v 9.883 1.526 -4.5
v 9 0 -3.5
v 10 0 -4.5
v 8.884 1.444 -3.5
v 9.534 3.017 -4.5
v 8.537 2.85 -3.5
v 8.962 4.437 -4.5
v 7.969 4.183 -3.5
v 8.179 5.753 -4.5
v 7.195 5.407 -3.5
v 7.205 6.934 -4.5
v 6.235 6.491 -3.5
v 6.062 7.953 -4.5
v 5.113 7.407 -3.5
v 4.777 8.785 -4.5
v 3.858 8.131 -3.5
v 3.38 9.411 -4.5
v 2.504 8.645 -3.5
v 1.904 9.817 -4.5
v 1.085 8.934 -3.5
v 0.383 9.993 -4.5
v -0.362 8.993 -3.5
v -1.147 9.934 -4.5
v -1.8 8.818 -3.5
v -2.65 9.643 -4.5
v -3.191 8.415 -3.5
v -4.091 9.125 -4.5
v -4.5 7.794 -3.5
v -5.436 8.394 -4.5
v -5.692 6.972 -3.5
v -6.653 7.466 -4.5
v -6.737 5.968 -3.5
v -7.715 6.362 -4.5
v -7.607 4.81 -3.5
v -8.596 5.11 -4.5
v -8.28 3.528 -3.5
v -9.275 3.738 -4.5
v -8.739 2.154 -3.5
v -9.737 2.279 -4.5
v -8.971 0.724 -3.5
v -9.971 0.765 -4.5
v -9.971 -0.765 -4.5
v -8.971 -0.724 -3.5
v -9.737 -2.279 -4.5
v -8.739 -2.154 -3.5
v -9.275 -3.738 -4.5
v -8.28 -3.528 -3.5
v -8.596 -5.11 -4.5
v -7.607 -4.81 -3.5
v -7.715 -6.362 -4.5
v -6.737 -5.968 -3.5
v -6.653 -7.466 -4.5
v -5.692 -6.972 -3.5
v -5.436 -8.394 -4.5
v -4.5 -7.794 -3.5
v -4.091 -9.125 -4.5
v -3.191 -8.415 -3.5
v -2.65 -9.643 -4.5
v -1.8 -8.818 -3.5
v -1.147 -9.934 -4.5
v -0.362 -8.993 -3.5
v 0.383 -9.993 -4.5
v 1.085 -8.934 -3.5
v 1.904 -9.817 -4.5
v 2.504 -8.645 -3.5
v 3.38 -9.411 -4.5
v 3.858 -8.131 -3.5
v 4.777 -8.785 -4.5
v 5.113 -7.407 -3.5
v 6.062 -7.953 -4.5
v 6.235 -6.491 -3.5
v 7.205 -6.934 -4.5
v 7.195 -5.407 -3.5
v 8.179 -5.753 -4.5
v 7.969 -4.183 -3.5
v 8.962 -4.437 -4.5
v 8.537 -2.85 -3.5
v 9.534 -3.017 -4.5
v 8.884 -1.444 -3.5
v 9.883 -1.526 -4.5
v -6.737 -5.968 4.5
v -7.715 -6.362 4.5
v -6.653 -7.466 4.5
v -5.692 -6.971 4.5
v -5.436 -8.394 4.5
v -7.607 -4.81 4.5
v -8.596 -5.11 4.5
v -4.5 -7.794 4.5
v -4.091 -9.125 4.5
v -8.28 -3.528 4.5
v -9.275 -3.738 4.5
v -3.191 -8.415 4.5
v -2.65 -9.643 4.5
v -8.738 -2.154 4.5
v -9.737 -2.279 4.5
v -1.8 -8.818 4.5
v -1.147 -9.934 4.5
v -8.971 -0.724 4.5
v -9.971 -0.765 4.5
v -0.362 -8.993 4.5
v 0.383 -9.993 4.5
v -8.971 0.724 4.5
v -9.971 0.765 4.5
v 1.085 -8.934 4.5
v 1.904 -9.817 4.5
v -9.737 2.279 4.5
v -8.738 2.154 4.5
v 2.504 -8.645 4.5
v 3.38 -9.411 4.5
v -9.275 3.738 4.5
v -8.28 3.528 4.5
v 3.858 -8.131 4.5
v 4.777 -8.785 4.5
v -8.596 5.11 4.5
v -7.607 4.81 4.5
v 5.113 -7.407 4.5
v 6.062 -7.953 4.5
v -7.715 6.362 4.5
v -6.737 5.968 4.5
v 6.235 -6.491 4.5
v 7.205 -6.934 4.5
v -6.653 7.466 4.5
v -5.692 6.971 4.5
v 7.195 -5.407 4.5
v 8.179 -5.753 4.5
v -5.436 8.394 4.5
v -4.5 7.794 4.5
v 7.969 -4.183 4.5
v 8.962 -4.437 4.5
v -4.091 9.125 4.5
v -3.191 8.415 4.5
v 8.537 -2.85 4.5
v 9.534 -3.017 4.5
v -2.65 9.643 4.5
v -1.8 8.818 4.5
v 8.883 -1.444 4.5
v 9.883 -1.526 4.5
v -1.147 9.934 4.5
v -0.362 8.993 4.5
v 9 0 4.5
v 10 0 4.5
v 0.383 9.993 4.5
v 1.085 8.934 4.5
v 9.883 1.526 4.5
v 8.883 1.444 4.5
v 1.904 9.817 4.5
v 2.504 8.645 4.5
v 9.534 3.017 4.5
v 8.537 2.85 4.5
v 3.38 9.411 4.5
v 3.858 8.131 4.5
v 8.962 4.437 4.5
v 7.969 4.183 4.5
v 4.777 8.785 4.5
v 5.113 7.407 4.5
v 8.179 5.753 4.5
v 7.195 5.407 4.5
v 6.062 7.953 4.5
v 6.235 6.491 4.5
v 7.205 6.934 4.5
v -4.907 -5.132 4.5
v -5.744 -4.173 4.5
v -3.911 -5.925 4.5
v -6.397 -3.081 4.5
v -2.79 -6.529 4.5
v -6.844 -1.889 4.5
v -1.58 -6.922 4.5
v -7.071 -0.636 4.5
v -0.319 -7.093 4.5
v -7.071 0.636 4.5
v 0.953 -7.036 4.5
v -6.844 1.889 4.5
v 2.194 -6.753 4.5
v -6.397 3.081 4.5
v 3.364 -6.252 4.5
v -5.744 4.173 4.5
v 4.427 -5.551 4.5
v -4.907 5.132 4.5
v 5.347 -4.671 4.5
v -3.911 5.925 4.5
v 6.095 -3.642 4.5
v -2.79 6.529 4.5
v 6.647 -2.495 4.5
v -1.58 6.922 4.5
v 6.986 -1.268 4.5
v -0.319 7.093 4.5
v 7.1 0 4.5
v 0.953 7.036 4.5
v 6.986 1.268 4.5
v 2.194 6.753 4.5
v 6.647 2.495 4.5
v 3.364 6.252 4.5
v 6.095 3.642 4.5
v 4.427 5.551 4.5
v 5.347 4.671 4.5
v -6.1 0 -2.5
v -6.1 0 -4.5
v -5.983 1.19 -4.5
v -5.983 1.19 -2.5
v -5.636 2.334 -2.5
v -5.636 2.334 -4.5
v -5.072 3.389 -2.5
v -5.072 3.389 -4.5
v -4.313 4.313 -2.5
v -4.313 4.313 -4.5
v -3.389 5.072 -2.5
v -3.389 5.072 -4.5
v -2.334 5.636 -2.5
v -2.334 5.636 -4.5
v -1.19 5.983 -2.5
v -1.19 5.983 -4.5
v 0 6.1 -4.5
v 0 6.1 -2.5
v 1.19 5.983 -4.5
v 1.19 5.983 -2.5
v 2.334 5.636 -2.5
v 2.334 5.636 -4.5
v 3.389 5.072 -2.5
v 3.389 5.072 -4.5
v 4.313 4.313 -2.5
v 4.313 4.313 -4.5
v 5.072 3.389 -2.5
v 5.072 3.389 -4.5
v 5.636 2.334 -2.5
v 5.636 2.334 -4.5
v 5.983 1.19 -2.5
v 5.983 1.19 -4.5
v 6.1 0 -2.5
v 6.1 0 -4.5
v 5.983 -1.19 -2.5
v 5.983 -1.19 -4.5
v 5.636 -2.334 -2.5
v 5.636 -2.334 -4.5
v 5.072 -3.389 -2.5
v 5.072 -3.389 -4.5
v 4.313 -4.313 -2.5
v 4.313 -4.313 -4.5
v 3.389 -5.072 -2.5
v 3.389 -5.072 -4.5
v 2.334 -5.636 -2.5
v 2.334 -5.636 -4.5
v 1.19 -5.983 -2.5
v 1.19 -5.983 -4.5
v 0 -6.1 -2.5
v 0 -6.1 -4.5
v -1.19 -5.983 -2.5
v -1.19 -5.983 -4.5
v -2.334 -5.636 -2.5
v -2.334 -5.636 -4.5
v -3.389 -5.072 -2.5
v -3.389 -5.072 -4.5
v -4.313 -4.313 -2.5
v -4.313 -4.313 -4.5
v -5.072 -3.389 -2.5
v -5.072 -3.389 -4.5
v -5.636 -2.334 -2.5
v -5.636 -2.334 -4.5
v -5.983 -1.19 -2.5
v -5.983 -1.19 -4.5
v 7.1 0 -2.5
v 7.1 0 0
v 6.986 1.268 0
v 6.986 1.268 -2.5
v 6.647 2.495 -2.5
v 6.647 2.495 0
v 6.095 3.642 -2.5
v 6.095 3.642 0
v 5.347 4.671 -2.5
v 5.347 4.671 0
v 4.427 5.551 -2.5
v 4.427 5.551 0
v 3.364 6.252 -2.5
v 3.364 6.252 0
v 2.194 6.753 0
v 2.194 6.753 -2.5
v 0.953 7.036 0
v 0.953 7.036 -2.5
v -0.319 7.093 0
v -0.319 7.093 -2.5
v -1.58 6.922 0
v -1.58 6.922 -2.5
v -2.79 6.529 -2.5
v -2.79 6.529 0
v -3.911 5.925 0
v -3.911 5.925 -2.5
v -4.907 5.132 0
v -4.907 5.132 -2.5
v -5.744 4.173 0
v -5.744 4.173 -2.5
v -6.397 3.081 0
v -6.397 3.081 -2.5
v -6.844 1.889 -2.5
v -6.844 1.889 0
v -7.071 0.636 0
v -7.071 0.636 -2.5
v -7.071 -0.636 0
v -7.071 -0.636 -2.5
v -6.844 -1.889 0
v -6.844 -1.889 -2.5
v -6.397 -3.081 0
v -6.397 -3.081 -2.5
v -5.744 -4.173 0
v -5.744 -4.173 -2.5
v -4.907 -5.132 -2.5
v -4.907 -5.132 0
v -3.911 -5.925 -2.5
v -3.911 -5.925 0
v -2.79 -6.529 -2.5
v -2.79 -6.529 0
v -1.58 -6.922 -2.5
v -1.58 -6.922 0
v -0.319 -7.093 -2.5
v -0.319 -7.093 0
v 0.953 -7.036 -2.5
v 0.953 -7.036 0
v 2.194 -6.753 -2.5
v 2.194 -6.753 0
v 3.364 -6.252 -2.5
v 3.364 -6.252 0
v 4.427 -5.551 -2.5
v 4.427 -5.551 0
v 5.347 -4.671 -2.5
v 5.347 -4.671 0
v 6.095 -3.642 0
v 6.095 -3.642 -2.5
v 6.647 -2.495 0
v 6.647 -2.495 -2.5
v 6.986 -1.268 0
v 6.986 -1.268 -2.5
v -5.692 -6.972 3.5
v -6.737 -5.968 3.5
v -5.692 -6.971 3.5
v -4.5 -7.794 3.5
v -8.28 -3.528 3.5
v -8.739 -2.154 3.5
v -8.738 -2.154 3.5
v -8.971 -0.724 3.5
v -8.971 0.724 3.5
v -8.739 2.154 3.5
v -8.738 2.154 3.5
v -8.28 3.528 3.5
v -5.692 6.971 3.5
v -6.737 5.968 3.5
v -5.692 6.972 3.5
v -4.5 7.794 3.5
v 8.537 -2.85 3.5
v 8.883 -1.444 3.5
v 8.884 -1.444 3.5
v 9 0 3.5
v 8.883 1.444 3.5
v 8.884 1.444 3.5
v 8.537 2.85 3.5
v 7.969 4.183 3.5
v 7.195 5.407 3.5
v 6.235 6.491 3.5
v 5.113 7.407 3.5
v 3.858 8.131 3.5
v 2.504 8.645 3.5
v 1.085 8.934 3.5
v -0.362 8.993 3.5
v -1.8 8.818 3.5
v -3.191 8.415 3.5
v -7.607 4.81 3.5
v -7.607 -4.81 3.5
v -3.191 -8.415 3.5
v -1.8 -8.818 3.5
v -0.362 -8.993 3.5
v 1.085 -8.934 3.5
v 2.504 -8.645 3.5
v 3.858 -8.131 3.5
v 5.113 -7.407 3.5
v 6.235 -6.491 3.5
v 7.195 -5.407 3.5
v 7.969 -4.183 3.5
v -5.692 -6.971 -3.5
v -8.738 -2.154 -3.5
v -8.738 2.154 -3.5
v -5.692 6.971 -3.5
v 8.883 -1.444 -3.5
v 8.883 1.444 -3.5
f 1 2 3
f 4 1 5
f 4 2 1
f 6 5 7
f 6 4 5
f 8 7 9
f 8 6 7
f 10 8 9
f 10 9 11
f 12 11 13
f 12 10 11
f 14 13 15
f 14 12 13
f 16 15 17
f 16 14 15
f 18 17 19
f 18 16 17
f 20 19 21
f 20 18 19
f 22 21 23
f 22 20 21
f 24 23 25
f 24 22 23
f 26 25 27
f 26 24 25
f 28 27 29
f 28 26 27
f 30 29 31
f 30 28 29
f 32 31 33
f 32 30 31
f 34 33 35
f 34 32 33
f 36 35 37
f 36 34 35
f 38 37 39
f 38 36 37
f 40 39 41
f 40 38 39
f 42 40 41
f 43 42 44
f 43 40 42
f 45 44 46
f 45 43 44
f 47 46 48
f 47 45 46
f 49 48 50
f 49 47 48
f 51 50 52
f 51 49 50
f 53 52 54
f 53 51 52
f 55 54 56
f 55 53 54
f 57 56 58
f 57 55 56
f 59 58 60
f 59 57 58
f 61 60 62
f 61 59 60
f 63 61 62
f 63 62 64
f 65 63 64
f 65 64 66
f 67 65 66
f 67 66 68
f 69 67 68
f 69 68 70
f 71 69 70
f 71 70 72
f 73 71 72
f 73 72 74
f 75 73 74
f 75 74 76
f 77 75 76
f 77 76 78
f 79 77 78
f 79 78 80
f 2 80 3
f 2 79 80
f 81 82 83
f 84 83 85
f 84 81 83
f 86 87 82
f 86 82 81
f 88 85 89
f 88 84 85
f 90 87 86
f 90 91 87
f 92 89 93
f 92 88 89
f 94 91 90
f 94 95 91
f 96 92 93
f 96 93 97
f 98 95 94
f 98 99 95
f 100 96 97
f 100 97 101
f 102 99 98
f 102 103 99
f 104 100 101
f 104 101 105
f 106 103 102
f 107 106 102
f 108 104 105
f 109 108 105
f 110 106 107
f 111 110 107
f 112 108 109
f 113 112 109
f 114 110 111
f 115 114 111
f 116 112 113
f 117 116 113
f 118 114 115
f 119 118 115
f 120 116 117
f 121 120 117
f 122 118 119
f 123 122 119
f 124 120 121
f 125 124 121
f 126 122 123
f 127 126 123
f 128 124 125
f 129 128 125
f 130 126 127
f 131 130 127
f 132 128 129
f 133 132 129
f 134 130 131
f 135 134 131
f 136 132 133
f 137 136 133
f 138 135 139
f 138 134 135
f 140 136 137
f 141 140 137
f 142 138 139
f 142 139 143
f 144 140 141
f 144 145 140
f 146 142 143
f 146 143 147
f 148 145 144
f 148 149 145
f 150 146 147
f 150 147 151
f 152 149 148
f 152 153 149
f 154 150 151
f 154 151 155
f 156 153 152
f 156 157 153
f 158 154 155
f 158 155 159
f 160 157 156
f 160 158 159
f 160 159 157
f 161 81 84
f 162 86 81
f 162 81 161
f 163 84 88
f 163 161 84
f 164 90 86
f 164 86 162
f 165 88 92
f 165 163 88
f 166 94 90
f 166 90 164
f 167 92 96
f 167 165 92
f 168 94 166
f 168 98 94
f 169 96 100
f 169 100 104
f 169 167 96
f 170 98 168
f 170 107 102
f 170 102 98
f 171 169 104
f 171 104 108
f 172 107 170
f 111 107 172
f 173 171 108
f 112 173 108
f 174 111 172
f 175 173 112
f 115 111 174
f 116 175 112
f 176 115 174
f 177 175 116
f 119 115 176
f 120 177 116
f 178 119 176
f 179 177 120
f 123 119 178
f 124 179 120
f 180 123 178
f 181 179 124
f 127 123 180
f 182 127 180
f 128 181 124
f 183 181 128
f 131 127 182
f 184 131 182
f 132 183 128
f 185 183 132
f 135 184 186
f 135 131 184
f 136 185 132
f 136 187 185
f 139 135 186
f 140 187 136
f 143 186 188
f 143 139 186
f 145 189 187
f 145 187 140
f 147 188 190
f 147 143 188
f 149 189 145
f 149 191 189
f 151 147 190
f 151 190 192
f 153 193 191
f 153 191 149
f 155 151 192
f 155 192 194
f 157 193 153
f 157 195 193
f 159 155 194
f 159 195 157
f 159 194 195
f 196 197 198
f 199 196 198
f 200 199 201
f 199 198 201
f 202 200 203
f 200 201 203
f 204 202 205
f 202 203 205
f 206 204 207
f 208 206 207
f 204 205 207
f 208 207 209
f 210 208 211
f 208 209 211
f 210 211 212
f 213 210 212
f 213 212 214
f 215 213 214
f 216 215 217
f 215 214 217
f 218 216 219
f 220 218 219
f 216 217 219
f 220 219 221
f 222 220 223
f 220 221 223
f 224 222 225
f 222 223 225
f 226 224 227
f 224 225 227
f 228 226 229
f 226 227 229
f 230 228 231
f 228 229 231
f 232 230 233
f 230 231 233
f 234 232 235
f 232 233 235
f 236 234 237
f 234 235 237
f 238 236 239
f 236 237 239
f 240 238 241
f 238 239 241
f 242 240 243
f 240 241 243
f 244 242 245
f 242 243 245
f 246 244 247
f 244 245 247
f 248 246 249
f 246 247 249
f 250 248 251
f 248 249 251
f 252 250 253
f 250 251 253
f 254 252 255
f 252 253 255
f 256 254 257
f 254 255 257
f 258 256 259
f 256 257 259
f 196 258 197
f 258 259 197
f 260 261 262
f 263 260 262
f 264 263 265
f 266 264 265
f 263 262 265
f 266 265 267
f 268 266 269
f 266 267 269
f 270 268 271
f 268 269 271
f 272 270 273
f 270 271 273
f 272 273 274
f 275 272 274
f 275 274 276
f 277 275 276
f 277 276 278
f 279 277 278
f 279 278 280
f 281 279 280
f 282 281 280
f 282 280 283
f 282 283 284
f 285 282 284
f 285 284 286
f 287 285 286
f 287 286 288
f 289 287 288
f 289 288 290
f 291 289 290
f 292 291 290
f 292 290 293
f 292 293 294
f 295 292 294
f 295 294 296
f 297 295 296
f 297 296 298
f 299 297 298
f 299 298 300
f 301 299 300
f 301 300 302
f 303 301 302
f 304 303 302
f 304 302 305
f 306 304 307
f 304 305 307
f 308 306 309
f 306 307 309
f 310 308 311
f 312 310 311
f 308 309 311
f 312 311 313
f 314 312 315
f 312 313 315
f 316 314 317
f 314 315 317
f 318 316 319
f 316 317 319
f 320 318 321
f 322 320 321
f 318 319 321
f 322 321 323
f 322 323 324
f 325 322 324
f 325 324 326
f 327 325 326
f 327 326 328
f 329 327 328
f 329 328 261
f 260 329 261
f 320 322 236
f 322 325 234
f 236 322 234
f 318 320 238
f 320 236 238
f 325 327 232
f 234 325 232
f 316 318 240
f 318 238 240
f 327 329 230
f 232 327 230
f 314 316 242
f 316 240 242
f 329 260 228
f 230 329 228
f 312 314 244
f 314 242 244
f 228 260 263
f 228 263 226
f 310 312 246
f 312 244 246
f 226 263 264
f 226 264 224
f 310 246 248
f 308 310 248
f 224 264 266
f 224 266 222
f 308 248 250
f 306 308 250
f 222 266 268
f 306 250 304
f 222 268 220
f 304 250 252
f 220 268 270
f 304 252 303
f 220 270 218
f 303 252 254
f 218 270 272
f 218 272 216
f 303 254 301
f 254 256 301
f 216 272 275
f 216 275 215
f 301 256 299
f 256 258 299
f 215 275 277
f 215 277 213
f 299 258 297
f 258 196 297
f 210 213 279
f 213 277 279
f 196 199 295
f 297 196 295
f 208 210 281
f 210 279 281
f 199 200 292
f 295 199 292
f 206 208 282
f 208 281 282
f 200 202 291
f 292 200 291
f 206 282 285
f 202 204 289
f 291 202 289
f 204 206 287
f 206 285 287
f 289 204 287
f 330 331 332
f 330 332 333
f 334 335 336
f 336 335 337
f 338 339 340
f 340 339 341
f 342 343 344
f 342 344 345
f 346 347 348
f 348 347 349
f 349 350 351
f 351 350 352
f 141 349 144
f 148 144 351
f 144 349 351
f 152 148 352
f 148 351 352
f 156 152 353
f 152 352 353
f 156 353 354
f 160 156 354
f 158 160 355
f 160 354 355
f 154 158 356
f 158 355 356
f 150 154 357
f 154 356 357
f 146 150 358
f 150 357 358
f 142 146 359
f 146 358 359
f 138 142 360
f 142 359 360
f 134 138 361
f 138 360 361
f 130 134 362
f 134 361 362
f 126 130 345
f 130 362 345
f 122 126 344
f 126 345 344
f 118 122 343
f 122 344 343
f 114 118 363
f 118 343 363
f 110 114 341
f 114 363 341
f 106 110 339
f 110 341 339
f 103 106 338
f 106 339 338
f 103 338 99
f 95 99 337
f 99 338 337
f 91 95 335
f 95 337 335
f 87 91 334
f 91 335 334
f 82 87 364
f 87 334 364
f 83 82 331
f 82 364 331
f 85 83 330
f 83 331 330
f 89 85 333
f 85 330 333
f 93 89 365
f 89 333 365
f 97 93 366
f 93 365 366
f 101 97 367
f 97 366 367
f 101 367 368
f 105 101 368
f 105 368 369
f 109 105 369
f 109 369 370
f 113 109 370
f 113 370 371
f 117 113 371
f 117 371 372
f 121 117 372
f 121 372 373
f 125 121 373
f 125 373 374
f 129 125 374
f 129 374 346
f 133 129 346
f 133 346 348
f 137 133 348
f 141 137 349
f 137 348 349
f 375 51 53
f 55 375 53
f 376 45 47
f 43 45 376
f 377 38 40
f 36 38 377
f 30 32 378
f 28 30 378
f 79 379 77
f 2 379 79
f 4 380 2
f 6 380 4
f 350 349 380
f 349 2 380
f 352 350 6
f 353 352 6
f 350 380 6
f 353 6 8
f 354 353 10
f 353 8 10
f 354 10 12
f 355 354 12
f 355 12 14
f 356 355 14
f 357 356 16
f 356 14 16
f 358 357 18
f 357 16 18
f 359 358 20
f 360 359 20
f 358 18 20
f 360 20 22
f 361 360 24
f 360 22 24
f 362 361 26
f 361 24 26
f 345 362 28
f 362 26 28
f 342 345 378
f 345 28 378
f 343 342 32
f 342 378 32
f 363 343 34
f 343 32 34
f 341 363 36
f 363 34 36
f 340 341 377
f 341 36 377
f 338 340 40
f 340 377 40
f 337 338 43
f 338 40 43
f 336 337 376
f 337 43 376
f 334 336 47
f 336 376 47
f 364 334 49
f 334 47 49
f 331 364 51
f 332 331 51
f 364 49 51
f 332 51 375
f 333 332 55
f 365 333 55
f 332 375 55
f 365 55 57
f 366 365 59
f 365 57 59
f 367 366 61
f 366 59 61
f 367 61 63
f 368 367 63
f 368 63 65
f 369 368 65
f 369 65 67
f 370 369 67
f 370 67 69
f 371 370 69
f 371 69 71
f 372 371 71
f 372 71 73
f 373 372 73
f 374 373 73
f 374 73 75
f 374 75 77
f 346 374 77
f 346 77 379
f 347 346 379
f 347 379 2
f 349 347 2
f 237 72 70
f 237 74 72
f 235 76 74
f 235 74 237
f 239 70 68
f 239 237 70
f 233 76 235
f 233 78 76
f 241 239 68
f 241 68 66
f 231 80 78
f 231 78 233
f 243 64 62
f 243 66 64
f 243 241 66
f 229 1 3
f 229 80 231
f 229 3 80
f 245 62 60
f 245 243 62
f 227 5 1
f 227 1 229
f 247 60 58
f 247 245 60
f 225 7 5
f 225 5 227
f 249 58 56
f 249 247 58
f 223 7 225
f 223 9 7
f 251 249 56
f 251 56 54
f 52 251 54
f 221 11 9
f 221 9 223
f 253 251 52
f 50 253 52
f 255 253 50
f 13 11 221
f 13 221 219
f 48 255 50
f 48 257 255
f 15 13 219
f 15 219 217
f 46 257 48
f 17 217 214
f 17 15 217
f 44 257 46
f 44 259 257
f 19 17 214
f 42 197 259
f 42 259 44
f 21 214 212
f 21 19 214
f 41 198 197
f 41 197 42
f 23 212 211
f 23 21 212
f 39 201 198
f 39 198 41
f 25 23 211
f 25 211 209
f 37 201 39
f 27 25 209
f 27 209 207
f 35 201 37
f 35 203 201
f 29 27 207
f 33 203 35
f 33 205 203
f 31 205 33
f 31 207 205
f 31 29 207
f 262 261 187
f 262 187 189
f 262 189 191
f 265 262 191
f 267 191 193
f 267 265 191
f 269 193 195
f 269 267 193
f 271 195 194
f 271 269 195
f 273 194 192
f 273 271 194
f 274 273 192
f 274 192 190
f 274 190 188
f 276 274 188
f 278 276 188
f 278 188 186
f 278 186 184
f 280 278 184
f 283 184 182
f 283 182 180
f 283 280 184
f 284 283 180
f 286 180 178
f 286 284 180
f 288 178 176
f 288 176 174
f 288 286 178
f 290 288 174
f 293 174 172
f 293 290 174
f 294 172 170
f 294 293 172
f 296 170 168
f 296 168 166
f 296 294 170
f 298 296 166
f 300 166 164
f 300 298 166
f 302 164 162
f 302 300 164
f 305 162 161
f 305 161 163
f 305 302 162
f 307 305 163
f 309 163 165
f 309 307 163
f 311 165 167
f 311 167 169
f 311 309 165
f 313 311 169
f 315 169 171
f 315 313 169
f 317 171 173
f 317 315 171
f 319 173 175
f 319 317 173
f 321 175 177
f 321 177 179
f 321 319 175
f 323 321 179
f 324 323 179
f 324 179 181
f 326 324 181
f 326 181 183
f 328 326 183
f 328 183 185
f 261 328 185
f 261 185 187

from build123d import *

# Parameters (mm, degrees)
SKETCH1_R           = 10
SKETCH1_R_2         = 9
SKETCH1_R_3         = 7.1
BOSS_EXTRUDE1_DEPTH = 4.5
SKETCH1_3_R         = 10
SKETCH1_3_R_2       = 9
CUT_EXTRUDE1_DEPTH  = 3.5
CHAMFER1_SIZE       = 1
SKETCH2_R           = 7.1
SKETCH2_R_2         = 6.1
BOSS_EXTRUDE2_DEPTH = 2


with BuildPart() as part:
    # Sketch1 → Boss-Extrude1 (new, symmetric)
    # profile 1 of 2: a face of its own
    with BuildSketch(Plane.XY):
        Circle(SKETCH1_R)
        Circle(SKETCH1_R_2, mode=Mode.SUBTRACT)
    # profile 2 of 2: a face of its own
    with BuildSketch(Plane.XY):
        Circle(SKETCH1_R_2)
        Circle(SKETCH1_R_3, mode=Mode.SUBTRACT)
    extrude(amount=BOSS_EXTRUDE1_DEPTH, both=True)

    # Sketch1<3> → Cut-Extrude1 (cut, symmetric)
    with BuildSketch(Plane.XY):
        Circle(SKETCH1_3_R)
        Circle(SKETCH1_3_R_2, mode=Mode.SUBTRACT)
    extrude(amount=CUT_EXTRUDE1_DEPTH, both=True, mode=Mode.SUBTRACT)

    # Chamfer1
    chamfer1_edges = [part.edges().sort_by_distance(p)[0] for p in [
        (-10, 0, -3.5),
        (-10, 0, 3.5),
    ]]
    chamfer(chamfer1_edges, length=CHAMFER1_SIZE - 0.0001)  # a hair under: the kernel refuses the full size

    # Sketch2 → Boss-Extrude2 (add)
    with BuildSketch(Plane(origin=(0, 0, -4.5), x_dir=(-1, 0, 0), z_dir=(0, 0, -1))):
        Circle(SKETCH2_R)
        Circle(SKETCH2_R_2, mode=Mode.SUBTRACT)
    extrude(amount=-BOSS_EXTRUDE2_DEPTH)


solid = part.part
